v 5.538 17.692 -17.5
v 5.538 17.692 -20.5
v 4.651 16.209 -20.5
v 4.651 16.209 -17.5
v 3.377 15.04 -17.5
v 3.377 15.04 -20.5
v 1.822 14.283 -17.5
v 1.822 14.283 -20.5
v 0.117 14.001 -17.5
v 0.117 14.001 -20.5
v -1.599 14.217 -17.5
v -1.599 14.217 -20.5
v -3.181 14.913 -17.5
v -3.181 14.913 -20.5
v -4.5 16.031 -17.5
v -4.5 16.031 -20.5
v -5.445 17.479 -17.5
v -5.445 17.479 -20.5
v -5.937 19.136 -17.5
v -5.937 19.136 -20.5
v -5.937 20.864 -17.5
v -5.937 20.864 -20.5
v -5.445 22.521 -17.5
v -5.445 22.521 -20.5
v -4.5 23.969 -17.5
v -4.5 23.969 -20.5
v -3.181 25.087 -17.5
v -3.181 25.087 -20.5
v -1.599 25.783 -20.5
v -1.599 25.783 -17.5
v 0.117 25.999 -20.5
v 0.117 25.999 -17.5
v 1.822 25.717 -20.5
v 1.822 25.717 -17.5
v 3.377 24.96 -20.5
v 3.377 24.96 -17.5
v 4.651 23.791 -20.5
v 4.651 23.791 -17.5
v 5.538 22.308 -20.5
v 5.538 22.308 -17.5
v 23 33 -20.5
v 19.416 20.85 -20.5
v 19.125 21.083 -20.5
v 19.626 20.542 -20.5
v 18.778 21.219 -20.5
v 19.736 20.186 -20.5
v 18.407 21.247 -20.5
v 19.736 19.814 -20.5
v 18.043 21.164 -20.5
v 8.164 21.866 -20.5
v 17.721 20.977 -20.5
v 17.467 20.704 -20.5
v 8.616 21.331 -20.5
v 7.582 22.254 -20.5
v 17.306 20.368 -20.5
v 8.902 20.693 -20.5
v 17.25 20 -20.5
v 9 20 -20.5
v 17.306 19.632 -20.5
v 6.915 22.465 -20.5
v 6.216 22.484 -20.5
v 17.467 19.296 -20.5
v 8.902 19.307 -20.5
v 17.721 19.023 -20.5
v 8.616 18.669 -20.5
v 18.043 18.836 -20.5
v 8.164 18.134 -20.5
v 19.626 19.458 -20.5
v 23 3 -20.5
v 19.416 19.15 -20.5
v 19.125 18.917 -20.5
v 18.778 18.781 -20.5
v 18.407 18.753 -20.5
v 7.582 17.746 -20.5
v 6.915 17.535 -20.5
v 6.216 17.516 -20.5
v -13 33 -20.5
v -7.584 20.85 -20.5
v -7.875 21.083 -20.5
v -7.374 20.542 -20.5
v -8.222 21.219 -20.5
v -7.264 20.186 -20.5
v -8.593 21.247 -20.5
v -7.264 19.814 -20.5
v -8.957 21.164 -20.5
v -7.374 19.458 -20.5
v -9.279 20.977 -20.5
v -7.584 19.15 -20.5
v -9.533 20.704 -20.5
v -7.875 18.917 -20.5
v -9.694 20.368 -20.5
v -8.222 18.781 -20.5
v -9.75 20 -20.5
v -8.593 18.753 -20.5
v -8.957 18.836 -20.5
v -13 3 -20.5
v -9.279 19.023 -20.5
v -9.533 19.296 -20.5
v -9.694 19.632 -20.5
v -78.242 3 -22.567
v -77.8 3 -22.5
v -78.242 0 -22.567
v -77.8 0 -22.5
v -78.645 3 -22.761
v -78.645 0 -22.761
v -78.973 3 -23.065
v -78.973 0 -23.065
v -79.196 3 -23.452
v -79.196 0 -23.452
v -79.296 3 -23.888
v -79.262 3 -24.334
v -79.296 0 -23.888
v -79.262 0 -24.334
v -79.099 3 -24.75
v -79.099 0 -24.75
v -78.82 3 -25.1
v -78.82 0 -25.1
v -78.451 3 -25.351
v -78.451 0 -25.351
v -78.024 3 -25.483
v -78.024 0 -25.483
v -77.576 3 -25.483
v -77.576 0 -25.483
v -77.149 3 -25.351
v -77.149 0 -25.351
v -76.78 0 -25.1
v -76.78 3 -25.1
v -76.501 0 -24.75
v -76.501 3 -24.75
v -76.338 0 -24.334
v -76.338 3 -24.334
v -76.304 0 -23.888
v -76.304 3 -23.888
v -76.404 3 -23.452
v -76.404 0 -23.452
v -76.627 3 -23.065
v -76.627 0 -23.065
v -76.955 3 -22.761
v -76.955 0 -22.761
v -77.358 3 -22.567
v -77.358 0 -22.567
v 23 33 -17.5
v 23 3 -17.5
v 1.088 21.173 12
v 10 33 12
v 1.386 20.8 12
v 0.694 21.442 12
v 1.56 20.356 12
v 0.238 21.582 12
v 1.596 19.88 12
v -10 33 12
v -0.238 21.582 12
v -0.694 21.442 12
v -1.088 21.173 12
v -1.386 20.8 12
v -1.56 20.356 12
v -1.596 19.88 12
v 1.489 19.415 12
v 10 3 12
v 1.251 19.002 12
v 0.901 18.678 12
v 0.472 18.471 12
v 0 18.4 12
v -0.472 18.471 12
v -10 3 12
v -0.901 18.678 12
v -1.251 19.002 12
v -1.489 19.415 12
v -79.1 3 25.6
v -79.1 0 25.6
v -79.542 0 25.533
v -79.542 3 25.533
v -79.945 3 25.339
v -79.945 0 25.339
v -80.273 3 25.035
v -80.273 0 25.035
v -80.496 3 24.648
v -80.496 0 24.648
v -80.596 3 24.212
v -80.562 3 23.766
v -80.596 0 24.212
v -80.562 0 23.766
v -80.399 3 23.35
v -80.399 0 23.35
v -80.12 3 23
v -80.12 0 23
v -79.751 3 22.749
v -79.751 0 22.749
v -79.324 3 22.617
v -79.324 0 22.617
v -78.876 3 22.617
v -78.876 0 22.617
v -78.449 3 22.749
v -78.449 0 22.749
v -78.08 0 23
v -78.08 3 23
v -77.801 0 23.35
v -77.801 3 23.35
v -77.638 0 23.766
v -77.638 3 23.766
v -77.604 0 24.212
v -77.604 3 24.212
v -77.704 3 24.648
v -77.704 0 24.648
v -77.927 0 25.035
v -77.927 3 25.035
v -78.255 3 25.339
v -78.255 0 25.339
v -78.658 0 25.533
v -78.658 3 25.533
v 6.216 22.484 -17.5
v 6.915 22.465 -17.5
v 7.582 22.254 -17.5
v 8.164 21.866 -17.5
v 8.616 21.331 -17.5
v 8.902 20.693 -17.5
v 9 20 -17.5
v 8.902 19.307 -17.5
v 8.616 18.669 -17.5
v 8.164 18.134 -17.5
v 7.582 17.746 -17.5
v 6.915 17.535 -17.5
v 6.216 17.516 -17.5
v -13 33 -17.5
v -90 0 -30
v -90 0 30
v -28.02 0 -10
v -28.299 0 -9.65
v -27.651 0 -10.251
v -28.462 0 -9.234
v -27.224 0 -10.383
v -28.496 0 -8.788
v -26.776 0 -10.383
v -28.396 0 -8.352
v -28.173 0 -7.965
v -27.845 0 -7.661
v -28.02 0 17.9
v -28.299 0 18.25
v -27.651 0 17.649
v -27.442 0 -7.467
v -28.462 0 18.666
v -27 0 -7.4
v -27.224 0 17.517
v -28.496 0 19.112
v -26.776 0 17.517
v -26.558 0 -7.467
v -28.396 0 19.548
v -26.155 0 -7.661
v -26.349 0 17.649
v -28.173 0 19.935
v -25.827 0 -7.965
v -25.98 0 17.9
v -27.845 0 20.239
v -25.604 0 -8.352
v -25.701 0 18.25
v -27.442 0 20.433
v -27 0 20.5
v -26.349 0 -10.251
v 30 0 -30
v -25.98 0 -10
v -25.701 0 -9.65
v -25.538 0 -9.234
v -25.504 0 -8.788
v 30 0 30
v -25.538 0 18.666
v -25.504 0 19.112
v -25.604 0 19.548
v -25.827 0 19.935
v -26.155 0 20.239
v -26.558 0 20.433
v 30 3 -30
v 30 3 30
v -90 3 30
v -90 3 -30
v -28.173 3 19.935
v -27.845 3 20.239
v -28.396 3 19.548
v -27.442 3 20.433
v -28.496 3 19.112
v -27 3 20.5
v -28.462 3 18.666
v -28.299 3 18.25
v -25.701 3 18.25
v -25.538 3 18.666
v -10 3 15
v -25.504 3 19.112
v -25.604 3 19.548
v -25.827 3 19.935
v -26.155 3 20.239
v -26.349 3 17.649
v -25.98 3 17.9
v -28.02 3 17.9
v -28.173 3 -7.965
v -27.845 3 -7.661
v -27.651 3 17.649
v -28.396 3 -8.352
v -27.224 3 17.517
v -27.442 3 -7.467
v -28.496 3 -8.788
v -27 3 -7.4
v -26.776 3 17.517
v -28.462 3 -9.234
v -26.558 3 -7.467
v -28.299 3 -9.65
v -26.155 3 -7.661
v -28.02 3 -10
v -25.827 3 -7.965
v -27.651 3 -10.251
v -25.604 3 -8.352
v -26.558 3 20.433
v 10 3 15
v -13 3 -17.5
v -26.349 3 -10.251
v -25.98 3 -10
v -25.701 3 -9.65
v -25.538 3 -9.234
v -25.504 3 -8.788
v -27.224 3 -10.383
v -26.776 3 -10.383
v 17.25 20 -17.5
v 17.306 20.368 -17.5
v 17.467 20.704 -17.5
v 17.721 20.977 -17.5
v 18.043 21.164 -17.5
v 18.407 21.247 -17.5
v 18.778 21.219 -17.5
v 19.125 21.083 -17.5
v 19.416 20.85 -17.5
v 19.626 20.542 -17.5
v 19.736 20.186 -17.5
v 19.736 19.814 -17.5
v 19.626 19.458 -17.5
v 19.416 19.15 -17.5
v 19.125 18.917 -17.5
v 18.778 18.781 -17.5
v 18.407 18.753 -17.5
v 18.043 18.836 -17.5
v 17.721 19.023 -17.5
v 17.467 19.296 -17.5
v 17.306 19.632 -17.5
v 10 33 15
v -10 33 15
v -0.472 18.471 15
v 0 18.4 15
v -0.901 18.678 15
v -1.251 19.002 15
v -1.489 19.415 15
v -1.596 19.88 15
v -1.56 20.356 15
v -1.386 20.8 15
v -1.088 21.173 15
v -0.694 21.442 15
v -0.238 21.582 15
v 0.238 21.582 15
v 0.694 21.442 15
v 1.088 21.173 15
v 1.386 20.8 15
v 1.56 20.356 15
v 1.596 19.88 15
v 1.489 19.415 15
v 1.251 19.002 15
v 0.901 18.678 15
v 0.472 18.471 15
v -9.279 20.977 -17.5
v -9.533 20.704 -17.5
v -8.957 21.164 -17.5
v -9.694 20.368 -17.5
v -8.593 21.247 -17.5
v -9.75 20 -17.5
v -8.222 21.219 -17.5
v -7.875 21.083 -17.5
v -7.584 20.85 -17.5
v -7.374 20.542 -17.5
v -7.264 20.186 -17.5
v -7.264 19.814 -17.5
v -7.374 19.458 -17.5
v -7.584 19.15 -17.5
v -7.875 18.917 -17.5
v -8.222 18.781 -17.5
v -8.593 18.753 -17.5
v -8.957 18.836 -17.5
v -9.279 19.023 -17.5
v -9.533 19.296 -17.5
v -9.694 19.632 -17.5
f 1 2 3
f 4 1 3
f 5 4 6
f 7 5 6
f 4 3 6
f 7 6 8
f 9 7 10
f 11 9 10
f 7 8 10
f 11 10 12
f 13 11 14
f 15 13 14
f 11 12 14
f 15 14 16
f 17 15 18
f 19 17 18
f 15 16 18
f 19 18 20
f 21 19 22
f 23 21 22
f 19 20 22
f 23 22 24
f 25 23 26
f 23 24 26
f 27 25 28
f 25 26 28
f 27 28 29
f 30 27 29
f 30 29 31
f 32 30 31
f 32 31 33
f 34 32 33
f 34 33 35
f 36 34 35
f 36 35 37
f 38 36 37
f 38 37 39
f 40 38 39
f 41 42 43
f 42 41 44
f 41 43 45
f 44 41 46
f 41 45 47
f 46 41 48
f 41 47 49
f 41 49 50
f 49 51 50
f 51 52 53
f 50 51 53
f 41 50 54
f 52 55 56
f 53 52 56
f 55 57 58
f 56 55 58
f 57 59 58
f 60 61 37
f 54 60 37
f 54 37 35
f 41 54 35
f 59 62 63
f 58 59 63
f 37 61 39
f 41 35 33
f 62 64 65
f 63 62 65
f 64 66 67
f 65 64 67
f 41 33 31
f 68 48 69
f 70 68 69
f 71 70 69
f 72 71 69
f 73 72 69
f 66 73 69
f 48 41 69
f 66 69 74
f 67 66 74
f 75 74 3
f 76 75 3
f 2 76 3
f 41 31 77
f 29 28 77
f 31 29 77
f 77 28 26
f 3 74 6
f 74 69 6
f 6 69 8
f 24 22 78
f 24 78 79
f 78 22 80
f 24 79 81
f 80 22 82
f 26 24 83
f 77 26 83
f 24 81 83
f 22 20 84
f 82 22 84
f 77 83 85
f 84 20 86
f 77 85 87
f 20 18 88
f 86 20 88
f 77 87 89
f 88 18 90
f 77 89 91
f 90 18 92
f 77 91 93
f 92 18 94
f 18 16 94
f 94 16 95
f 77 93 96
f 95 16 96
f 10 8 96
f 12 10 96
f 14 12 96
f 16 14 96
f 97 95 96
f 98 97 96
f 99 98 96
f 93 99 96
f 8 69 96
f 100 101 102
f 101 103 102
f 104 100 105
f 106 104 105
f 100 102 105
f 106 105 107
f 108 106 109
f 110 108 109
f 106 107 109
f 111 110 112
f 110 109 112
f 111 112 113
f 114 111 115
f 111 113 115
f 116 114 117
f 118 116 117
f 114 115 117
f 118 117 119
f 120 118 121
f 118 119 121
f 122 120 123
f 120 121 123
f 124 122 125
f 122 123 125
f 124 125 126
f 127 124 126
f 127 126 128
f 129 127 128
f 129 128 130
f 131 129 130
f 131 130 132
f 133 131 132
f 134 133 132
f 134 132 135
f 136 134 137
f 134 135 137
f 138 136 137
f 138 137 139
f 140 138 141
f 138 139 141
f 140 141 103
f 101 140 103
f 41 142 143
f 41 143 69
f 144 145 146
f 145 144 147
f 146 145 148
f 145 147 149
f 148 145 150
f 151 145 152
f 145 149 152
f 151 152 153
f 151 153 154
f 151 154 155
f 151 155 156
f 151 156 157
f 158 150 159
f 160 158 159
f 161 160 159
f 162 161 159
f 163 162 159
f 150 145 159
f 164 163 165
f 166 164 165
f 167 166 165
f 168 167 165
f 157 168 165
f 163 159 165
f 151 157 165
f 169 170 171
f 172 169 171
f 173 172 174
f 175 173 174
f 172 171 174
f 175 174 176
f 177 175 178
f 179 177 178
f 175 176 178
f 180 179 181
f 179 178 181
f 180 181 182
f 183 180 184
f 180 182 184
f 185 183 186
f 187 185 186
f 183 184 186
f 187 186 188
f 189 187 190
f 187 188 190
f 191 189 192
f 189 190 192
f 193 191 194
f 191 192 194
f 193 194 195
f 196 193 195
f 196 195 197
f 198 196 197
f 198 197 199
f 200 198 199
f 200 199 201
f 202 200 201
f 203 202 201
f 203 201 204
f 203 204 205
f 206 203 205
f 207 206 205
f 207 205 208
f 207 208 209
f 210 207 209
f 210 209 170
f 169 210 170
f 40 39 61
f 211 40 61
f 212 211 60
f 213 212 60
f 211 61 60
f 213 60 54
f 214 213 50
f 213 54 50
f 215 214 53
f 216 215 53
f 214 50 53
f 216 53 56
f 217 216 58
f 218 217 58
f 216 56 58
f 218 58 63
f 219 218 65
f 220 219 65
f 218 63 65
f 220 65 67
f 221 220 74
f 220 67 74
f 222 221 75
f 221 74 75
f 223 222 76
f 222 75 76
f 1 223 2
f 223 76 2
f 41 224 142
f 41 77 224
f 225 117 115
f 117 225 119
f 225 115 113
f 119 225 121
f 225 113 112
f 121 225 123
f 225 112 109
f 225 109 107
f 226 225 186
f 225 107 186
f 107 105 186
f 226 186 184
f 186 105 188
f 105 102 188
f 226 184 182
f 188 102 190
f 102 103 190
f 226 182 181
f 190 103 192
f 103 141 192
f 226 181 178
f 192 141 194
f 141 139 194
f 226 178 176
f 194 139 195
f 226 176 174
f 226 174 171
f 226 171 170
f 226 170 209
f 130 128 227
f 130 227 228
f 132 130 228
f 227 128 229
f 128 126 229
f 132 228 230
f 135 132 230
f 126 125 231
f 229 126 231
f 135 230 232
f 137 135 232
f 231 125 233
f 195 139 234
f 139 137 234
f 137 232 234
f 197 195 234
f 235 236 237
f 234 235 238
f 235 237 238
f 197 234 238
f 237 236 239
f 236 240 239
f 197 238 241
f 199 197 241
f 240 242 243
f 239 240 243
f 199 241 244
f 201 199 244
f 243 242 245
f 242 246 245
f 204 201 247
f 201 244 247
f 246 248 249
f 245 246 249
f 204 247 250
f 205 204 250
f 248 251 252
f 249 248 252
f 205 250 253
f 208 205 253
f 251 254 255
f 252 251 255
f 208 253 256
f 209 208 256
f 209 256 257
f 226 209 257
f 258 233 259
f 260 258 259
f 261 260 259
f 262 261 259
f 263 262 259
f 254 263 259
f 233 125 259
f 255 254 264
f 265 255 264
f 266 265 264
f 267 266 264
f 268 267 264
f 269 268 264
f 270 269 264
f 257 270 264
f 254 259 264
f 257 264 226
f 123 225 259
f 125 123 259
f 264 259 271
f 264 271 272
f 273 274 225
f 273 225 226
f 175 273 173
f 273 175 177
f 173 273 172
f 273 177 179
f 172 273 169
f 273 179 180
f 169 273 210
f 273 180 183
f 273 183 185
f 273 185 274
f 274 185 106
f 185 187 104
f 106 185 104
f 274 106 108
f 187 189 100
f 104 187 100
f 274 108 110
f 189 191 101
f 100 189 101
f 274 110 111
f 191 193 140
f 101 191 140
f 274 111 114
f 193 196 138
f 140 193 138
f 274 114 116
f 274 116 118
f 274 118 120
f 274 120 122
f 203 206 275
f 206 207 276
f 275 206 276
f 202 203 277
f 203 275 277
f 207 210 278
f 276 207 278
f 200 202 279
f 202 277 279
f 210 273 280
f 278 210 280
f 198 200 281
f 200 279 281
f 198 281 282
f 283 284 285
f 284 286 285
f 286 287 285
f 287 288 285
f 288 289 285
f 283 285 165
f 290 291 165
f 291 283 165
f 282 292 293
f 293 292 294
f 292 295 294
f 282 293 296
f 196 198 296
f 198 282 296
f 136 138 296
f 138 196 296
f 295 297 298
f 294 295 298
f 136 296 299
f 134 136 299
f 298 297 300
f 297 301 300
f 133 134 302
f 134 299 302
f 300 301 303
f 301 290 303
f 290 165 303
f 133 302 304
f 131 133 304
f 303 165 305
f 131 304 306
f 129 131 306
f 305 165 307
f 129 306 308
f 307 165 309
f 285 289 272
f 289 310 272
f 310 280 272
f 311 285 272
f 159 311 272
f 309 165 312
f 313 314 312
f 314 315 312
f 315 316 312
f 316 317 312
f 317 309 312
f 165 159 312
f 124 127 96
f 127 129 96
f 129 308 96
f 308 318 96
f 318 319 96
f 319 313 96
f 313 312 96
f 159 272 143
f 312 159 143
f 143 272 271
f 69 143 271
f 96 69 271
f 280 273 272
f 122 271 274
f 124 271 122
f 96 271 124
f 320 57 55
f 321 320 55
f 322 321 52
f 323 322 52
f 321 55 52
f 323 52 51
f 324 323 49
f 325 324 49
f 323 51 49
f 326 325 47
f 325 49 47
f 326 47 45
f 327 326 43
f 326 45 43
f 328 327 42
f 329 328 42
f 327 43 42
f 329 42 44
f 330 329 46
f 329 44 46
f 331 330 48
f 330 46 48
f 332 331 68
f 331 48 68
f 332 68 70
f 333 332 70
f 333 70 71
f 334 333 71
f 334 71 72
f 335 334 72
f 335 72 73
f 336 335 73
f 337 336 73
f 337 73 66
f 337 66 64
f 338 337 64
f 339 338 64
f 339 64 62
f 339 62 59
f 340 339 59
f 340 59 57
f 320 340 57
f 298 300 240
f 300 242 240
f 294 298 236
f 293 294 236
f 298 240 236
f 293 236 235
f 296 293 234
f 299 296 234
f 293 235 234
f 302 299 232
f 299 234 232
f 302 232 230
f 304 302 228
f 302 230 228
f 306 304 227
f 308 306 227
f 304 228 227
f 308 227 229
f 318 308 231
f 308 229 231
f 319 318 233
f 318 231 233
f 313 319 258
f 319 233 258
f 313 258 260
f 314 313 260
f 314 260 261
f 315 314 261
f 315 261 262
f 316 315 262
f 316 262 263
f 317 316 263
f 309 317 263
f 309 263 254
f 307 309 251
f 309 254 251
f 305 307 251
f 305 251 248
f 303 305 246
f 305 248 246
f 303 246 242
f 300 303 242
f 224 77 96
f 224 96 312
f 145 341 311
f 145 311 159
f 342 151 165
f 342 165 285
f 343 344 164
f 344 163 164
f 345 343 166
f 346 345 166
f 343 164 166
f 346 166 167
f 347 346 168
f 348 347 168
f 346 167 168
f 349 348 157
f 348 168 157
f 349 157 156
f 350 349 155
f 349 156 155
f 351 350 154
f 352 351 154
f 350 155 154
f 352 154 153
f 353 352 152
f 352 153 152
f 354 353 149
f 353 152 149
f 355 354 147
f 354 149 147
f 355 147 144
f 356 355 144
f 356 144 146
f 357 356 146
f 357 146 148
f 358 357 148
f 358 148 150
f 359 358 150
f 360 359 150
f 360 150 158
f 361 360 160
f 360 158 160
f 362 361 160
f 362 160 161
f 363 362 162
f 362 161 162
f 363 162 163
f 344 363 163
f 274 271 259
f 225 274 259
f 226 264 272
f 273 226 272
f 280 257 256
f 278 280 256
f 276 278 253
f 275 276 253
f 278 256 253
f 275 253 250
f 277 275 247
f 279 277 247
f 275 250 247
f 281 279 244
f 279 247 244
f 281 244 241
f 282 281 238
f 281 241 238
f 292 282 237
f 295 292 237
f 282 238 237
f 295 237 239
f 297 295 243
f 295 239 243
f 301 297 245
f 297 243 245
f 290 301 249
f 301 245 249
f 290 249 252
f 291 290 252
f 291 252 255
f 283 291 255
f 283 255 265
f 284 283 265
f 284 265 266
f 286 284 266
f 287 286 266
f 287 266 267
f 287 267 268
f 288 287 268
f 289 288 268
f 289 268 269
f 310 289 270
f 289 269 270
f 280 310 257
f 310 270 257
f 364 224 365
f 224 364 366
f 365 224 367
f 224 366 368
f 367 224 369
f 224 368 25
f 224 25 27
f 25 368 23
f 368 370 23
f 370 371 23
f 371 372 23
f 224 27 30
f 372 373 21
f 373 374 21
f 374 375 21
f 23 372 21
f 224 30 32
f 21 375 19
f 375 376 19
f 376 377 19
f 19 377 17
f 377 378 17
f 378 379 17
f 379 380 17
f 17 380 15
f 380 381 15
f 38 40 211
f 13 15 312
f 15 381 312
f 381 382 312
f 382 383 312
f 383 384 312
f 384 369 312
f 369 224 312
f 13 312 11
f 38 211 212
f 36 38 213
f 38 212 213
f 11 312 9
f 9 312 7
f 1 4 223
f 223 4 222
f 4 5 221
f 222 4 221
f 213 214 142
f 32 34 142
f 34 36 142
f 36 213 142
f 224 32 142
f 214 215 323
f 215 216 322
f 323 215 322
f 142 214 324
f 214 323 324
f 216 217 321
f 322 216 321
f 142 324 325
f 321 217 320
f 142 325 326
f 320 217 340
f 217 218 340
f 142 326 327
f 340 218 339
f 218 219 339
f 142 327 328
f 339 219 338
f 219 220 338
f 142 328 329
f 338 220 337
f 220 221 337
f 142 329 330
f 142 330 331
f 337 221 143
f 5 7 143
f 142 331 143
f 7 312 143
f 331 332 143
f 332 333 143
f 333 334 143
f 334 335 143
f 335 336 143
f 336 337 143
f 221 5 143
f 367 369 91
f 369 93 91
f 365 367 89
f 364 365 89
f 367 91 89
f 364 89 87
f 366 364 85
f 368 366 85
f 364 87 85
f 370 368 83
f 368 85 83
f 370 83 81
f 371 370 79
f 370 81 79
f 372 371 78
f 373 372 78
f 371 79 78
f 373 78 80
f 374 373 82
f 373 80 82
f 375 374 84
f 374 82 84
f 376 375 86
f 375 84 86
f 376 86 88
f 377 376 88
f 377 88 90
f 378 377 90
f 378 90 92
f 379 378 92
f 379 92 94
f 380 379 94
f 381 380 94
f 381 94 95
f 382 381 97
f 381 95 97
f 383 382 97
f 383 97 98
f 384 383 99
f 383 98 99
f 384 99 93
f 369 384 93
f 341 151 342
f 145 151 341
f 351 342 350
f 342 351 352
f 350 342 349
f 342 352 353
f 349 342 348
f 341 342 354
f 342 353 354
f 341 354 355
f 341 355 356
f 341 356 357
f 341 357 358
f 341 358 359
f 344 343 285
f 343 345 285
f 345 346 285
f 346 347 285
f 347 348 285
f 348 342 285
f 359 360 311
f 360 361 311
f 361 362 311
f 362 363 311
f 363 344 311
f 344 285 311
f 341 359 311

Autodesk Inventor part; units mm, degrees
ref_plane "YZ Plane" through (0, 0, 0) normal (1, 0, 0) x (0, 1, 0)
ref_plane "XZ Plane" through (0, 0, 0) normal (0, 1, 0) x (-1, 0, 0)
ref_plane "XY Plane" through (0, 0, 0) normal (0, 0, 1) x (1, 0, 0)
sketch "Szkic1" plane through (0, 0, 0) normal (0, 1, 0) x (-1, 0, 0)
  line L0 (30, -30) -> (-30, -30)
  line L1 (-30, -30) -> (-30, 30)
  line L2 (-30, 30) -> (30, 30)
  line L3 (30, 30) -> (30, -30)
  line L4 (30, -30) -> (-30, 30) construction
  line L5 (-30, -30) -> (30, 30) construction
  point P0 (0, 0)
  dimension "d0" = 60
  dimension "d1" = 60
extrude "Wyciągnięcie proste1" add sketch "Szkic1" along normal blind 3
sketch "Szkic2" plane through (0, 3, 0) normal (0, 1, 0) x (1, 0, 0)
  line L0 (10, -12) -> (-10, -12)
  line L1 (-10, -12) -> (-10, -15)
  line L2 (-10, -15) -> (10, -15)
  line L3 (10, -15) -> (10, -12)
  point P0 (0, 0)
  dimension "d4" = 20
  dimension "d5" = 3
  dimension "d6" = 12
  dimension "d7" = 10
sketch "Szkic3" plane through (0, 3, 0) normal (0, 1, 0) x (1, 0, 0)
  point P0 (0, 0)
sketch "Szkic4" plane through (0, 3, 0) normal (0, 1, 0) x (1, 0, 0)
  line L0 (-13, 17.5) -> (23, 17.5)
  line L1 (23, 17.5) -> (23, 20.5)
  line L2 (23, 20.5) -> (-13, 20.5)
  line L3 (-13, 20.5) -> (-13, 17.5)
  point P0 (0, 0)
  dimension "d8" = 3
  dimension "d9" = 36
  dimension "d10" = 17.5
  dimension "d11" = 13
extrude "Wyciągnięcie proste2" add sketch "Szkic4" along normal blind 30
sketch "Szkic5" plane through (23, 3, -20.5) normal (0, 0, -1) x (-1, 0, 0)
  line L0 (0, 30) -> (36, 30) projected
  line L1 (36, 0) -> (36, 30) projected
  arc A0 (17.4615, 14.6923) -> (17.4615, 19.3077) centre (23, 17) ccw
  arc A1 (17.4615, 19.3077) -> (17.4615, 14.6923) centre (16.5, 17) ccw
  line L2 (0, 0) -> (0, 30) projected
  circle A2 centre (4.5, 17) radius 1.25
  circle A3 centre (31.5, 17) radius 1.25
  point P0 (23, -3)
  dimension "d14" = 13
  dimension "d15" = 13
  dimension "d16" = 12
  dimension "d17" = 6.5
  dimension "d18" = 5
  dimension "d19" = 4.5
  dimension "d20" = 4.5
  dimension "d21" = 2.5
  dimension "d22" = 2.5
extrude "Wyciągnięcie proste3" cut sketch "Szkic5" against normal blind 30
sketch "Szkic6" plane through (0, 3, 0) normal (0, 1, 0) x (1, 0, 0)
  point P0 (0, 0)
extrude "Wyciągnięcie proste4" add sketch "Szkic2" along normal blind 30
sketch "Szkic7" plane through (10, 3, 12) normal (0, 0, -1) x (-1, 0, 0)
  point P0 (10, -3)
sketch "Szkic8" plane through (-10, 3, 15) normal (0, 0, 1) x (1, 0, 0)
  line L0 (20, 0) -> (0, 0) projected
  point P0 (10, -3)
  point P1 (10, 17)
  dimension "d27" = 17
hole "Otwór1" at (0, 20, 15) direction (0, 0, -1) diameter 3.2 end through all
sketch "Szkic9" plane through (-30, 0, -30) normal (-1, 0, 0) x (0, 0, 1)
  line L0 (60, 3) -> (0, 3) projected
  line L1 (0, 0) -> (60, 0)
  line L2 (60, 0) -> (60, 3)
  line L3 (60, 3) -> (0, 3)
  line L4 (0, 3) -> (0, 0)
  point P0 (30, 0)
extrude "Wyciągnięcie proste5" add sketch "Szkic9" along normal blind 60
sketch "Szkic10" plane through (0, 3, 0) normal (0, 1, 0) x (1, 0, 0)
  line L0 (-13, 20.5) -> (-13, 17.5) projected
  line L1 (30, -30) -> (-90, -30) projected
  point P0 (0, 0)
  point P1 (-27, -19)
  point P2 (-27, 8.9)
  point P3 (-77.8, 24)
  point P4 (-79.1, -24.1)
  dimension "d38" = 14
  dimension "d39" = 11
  dimension "d40" = 27.9
  dimension "d41" = 50.8
  dimension "d42" = 54
  dimension "d43" = 1.3
  dimension "d44" = 5.9
hole "Otwór2" at (-27, 3, 19) at (-27, 3, -8.9) at (-77.8, 3, -24) at (-79.1, 3, 24.1) direction (0, -1, 0) diameter 3 end through all
properties part number "podstawa" material "Drewno (brzoza)"
